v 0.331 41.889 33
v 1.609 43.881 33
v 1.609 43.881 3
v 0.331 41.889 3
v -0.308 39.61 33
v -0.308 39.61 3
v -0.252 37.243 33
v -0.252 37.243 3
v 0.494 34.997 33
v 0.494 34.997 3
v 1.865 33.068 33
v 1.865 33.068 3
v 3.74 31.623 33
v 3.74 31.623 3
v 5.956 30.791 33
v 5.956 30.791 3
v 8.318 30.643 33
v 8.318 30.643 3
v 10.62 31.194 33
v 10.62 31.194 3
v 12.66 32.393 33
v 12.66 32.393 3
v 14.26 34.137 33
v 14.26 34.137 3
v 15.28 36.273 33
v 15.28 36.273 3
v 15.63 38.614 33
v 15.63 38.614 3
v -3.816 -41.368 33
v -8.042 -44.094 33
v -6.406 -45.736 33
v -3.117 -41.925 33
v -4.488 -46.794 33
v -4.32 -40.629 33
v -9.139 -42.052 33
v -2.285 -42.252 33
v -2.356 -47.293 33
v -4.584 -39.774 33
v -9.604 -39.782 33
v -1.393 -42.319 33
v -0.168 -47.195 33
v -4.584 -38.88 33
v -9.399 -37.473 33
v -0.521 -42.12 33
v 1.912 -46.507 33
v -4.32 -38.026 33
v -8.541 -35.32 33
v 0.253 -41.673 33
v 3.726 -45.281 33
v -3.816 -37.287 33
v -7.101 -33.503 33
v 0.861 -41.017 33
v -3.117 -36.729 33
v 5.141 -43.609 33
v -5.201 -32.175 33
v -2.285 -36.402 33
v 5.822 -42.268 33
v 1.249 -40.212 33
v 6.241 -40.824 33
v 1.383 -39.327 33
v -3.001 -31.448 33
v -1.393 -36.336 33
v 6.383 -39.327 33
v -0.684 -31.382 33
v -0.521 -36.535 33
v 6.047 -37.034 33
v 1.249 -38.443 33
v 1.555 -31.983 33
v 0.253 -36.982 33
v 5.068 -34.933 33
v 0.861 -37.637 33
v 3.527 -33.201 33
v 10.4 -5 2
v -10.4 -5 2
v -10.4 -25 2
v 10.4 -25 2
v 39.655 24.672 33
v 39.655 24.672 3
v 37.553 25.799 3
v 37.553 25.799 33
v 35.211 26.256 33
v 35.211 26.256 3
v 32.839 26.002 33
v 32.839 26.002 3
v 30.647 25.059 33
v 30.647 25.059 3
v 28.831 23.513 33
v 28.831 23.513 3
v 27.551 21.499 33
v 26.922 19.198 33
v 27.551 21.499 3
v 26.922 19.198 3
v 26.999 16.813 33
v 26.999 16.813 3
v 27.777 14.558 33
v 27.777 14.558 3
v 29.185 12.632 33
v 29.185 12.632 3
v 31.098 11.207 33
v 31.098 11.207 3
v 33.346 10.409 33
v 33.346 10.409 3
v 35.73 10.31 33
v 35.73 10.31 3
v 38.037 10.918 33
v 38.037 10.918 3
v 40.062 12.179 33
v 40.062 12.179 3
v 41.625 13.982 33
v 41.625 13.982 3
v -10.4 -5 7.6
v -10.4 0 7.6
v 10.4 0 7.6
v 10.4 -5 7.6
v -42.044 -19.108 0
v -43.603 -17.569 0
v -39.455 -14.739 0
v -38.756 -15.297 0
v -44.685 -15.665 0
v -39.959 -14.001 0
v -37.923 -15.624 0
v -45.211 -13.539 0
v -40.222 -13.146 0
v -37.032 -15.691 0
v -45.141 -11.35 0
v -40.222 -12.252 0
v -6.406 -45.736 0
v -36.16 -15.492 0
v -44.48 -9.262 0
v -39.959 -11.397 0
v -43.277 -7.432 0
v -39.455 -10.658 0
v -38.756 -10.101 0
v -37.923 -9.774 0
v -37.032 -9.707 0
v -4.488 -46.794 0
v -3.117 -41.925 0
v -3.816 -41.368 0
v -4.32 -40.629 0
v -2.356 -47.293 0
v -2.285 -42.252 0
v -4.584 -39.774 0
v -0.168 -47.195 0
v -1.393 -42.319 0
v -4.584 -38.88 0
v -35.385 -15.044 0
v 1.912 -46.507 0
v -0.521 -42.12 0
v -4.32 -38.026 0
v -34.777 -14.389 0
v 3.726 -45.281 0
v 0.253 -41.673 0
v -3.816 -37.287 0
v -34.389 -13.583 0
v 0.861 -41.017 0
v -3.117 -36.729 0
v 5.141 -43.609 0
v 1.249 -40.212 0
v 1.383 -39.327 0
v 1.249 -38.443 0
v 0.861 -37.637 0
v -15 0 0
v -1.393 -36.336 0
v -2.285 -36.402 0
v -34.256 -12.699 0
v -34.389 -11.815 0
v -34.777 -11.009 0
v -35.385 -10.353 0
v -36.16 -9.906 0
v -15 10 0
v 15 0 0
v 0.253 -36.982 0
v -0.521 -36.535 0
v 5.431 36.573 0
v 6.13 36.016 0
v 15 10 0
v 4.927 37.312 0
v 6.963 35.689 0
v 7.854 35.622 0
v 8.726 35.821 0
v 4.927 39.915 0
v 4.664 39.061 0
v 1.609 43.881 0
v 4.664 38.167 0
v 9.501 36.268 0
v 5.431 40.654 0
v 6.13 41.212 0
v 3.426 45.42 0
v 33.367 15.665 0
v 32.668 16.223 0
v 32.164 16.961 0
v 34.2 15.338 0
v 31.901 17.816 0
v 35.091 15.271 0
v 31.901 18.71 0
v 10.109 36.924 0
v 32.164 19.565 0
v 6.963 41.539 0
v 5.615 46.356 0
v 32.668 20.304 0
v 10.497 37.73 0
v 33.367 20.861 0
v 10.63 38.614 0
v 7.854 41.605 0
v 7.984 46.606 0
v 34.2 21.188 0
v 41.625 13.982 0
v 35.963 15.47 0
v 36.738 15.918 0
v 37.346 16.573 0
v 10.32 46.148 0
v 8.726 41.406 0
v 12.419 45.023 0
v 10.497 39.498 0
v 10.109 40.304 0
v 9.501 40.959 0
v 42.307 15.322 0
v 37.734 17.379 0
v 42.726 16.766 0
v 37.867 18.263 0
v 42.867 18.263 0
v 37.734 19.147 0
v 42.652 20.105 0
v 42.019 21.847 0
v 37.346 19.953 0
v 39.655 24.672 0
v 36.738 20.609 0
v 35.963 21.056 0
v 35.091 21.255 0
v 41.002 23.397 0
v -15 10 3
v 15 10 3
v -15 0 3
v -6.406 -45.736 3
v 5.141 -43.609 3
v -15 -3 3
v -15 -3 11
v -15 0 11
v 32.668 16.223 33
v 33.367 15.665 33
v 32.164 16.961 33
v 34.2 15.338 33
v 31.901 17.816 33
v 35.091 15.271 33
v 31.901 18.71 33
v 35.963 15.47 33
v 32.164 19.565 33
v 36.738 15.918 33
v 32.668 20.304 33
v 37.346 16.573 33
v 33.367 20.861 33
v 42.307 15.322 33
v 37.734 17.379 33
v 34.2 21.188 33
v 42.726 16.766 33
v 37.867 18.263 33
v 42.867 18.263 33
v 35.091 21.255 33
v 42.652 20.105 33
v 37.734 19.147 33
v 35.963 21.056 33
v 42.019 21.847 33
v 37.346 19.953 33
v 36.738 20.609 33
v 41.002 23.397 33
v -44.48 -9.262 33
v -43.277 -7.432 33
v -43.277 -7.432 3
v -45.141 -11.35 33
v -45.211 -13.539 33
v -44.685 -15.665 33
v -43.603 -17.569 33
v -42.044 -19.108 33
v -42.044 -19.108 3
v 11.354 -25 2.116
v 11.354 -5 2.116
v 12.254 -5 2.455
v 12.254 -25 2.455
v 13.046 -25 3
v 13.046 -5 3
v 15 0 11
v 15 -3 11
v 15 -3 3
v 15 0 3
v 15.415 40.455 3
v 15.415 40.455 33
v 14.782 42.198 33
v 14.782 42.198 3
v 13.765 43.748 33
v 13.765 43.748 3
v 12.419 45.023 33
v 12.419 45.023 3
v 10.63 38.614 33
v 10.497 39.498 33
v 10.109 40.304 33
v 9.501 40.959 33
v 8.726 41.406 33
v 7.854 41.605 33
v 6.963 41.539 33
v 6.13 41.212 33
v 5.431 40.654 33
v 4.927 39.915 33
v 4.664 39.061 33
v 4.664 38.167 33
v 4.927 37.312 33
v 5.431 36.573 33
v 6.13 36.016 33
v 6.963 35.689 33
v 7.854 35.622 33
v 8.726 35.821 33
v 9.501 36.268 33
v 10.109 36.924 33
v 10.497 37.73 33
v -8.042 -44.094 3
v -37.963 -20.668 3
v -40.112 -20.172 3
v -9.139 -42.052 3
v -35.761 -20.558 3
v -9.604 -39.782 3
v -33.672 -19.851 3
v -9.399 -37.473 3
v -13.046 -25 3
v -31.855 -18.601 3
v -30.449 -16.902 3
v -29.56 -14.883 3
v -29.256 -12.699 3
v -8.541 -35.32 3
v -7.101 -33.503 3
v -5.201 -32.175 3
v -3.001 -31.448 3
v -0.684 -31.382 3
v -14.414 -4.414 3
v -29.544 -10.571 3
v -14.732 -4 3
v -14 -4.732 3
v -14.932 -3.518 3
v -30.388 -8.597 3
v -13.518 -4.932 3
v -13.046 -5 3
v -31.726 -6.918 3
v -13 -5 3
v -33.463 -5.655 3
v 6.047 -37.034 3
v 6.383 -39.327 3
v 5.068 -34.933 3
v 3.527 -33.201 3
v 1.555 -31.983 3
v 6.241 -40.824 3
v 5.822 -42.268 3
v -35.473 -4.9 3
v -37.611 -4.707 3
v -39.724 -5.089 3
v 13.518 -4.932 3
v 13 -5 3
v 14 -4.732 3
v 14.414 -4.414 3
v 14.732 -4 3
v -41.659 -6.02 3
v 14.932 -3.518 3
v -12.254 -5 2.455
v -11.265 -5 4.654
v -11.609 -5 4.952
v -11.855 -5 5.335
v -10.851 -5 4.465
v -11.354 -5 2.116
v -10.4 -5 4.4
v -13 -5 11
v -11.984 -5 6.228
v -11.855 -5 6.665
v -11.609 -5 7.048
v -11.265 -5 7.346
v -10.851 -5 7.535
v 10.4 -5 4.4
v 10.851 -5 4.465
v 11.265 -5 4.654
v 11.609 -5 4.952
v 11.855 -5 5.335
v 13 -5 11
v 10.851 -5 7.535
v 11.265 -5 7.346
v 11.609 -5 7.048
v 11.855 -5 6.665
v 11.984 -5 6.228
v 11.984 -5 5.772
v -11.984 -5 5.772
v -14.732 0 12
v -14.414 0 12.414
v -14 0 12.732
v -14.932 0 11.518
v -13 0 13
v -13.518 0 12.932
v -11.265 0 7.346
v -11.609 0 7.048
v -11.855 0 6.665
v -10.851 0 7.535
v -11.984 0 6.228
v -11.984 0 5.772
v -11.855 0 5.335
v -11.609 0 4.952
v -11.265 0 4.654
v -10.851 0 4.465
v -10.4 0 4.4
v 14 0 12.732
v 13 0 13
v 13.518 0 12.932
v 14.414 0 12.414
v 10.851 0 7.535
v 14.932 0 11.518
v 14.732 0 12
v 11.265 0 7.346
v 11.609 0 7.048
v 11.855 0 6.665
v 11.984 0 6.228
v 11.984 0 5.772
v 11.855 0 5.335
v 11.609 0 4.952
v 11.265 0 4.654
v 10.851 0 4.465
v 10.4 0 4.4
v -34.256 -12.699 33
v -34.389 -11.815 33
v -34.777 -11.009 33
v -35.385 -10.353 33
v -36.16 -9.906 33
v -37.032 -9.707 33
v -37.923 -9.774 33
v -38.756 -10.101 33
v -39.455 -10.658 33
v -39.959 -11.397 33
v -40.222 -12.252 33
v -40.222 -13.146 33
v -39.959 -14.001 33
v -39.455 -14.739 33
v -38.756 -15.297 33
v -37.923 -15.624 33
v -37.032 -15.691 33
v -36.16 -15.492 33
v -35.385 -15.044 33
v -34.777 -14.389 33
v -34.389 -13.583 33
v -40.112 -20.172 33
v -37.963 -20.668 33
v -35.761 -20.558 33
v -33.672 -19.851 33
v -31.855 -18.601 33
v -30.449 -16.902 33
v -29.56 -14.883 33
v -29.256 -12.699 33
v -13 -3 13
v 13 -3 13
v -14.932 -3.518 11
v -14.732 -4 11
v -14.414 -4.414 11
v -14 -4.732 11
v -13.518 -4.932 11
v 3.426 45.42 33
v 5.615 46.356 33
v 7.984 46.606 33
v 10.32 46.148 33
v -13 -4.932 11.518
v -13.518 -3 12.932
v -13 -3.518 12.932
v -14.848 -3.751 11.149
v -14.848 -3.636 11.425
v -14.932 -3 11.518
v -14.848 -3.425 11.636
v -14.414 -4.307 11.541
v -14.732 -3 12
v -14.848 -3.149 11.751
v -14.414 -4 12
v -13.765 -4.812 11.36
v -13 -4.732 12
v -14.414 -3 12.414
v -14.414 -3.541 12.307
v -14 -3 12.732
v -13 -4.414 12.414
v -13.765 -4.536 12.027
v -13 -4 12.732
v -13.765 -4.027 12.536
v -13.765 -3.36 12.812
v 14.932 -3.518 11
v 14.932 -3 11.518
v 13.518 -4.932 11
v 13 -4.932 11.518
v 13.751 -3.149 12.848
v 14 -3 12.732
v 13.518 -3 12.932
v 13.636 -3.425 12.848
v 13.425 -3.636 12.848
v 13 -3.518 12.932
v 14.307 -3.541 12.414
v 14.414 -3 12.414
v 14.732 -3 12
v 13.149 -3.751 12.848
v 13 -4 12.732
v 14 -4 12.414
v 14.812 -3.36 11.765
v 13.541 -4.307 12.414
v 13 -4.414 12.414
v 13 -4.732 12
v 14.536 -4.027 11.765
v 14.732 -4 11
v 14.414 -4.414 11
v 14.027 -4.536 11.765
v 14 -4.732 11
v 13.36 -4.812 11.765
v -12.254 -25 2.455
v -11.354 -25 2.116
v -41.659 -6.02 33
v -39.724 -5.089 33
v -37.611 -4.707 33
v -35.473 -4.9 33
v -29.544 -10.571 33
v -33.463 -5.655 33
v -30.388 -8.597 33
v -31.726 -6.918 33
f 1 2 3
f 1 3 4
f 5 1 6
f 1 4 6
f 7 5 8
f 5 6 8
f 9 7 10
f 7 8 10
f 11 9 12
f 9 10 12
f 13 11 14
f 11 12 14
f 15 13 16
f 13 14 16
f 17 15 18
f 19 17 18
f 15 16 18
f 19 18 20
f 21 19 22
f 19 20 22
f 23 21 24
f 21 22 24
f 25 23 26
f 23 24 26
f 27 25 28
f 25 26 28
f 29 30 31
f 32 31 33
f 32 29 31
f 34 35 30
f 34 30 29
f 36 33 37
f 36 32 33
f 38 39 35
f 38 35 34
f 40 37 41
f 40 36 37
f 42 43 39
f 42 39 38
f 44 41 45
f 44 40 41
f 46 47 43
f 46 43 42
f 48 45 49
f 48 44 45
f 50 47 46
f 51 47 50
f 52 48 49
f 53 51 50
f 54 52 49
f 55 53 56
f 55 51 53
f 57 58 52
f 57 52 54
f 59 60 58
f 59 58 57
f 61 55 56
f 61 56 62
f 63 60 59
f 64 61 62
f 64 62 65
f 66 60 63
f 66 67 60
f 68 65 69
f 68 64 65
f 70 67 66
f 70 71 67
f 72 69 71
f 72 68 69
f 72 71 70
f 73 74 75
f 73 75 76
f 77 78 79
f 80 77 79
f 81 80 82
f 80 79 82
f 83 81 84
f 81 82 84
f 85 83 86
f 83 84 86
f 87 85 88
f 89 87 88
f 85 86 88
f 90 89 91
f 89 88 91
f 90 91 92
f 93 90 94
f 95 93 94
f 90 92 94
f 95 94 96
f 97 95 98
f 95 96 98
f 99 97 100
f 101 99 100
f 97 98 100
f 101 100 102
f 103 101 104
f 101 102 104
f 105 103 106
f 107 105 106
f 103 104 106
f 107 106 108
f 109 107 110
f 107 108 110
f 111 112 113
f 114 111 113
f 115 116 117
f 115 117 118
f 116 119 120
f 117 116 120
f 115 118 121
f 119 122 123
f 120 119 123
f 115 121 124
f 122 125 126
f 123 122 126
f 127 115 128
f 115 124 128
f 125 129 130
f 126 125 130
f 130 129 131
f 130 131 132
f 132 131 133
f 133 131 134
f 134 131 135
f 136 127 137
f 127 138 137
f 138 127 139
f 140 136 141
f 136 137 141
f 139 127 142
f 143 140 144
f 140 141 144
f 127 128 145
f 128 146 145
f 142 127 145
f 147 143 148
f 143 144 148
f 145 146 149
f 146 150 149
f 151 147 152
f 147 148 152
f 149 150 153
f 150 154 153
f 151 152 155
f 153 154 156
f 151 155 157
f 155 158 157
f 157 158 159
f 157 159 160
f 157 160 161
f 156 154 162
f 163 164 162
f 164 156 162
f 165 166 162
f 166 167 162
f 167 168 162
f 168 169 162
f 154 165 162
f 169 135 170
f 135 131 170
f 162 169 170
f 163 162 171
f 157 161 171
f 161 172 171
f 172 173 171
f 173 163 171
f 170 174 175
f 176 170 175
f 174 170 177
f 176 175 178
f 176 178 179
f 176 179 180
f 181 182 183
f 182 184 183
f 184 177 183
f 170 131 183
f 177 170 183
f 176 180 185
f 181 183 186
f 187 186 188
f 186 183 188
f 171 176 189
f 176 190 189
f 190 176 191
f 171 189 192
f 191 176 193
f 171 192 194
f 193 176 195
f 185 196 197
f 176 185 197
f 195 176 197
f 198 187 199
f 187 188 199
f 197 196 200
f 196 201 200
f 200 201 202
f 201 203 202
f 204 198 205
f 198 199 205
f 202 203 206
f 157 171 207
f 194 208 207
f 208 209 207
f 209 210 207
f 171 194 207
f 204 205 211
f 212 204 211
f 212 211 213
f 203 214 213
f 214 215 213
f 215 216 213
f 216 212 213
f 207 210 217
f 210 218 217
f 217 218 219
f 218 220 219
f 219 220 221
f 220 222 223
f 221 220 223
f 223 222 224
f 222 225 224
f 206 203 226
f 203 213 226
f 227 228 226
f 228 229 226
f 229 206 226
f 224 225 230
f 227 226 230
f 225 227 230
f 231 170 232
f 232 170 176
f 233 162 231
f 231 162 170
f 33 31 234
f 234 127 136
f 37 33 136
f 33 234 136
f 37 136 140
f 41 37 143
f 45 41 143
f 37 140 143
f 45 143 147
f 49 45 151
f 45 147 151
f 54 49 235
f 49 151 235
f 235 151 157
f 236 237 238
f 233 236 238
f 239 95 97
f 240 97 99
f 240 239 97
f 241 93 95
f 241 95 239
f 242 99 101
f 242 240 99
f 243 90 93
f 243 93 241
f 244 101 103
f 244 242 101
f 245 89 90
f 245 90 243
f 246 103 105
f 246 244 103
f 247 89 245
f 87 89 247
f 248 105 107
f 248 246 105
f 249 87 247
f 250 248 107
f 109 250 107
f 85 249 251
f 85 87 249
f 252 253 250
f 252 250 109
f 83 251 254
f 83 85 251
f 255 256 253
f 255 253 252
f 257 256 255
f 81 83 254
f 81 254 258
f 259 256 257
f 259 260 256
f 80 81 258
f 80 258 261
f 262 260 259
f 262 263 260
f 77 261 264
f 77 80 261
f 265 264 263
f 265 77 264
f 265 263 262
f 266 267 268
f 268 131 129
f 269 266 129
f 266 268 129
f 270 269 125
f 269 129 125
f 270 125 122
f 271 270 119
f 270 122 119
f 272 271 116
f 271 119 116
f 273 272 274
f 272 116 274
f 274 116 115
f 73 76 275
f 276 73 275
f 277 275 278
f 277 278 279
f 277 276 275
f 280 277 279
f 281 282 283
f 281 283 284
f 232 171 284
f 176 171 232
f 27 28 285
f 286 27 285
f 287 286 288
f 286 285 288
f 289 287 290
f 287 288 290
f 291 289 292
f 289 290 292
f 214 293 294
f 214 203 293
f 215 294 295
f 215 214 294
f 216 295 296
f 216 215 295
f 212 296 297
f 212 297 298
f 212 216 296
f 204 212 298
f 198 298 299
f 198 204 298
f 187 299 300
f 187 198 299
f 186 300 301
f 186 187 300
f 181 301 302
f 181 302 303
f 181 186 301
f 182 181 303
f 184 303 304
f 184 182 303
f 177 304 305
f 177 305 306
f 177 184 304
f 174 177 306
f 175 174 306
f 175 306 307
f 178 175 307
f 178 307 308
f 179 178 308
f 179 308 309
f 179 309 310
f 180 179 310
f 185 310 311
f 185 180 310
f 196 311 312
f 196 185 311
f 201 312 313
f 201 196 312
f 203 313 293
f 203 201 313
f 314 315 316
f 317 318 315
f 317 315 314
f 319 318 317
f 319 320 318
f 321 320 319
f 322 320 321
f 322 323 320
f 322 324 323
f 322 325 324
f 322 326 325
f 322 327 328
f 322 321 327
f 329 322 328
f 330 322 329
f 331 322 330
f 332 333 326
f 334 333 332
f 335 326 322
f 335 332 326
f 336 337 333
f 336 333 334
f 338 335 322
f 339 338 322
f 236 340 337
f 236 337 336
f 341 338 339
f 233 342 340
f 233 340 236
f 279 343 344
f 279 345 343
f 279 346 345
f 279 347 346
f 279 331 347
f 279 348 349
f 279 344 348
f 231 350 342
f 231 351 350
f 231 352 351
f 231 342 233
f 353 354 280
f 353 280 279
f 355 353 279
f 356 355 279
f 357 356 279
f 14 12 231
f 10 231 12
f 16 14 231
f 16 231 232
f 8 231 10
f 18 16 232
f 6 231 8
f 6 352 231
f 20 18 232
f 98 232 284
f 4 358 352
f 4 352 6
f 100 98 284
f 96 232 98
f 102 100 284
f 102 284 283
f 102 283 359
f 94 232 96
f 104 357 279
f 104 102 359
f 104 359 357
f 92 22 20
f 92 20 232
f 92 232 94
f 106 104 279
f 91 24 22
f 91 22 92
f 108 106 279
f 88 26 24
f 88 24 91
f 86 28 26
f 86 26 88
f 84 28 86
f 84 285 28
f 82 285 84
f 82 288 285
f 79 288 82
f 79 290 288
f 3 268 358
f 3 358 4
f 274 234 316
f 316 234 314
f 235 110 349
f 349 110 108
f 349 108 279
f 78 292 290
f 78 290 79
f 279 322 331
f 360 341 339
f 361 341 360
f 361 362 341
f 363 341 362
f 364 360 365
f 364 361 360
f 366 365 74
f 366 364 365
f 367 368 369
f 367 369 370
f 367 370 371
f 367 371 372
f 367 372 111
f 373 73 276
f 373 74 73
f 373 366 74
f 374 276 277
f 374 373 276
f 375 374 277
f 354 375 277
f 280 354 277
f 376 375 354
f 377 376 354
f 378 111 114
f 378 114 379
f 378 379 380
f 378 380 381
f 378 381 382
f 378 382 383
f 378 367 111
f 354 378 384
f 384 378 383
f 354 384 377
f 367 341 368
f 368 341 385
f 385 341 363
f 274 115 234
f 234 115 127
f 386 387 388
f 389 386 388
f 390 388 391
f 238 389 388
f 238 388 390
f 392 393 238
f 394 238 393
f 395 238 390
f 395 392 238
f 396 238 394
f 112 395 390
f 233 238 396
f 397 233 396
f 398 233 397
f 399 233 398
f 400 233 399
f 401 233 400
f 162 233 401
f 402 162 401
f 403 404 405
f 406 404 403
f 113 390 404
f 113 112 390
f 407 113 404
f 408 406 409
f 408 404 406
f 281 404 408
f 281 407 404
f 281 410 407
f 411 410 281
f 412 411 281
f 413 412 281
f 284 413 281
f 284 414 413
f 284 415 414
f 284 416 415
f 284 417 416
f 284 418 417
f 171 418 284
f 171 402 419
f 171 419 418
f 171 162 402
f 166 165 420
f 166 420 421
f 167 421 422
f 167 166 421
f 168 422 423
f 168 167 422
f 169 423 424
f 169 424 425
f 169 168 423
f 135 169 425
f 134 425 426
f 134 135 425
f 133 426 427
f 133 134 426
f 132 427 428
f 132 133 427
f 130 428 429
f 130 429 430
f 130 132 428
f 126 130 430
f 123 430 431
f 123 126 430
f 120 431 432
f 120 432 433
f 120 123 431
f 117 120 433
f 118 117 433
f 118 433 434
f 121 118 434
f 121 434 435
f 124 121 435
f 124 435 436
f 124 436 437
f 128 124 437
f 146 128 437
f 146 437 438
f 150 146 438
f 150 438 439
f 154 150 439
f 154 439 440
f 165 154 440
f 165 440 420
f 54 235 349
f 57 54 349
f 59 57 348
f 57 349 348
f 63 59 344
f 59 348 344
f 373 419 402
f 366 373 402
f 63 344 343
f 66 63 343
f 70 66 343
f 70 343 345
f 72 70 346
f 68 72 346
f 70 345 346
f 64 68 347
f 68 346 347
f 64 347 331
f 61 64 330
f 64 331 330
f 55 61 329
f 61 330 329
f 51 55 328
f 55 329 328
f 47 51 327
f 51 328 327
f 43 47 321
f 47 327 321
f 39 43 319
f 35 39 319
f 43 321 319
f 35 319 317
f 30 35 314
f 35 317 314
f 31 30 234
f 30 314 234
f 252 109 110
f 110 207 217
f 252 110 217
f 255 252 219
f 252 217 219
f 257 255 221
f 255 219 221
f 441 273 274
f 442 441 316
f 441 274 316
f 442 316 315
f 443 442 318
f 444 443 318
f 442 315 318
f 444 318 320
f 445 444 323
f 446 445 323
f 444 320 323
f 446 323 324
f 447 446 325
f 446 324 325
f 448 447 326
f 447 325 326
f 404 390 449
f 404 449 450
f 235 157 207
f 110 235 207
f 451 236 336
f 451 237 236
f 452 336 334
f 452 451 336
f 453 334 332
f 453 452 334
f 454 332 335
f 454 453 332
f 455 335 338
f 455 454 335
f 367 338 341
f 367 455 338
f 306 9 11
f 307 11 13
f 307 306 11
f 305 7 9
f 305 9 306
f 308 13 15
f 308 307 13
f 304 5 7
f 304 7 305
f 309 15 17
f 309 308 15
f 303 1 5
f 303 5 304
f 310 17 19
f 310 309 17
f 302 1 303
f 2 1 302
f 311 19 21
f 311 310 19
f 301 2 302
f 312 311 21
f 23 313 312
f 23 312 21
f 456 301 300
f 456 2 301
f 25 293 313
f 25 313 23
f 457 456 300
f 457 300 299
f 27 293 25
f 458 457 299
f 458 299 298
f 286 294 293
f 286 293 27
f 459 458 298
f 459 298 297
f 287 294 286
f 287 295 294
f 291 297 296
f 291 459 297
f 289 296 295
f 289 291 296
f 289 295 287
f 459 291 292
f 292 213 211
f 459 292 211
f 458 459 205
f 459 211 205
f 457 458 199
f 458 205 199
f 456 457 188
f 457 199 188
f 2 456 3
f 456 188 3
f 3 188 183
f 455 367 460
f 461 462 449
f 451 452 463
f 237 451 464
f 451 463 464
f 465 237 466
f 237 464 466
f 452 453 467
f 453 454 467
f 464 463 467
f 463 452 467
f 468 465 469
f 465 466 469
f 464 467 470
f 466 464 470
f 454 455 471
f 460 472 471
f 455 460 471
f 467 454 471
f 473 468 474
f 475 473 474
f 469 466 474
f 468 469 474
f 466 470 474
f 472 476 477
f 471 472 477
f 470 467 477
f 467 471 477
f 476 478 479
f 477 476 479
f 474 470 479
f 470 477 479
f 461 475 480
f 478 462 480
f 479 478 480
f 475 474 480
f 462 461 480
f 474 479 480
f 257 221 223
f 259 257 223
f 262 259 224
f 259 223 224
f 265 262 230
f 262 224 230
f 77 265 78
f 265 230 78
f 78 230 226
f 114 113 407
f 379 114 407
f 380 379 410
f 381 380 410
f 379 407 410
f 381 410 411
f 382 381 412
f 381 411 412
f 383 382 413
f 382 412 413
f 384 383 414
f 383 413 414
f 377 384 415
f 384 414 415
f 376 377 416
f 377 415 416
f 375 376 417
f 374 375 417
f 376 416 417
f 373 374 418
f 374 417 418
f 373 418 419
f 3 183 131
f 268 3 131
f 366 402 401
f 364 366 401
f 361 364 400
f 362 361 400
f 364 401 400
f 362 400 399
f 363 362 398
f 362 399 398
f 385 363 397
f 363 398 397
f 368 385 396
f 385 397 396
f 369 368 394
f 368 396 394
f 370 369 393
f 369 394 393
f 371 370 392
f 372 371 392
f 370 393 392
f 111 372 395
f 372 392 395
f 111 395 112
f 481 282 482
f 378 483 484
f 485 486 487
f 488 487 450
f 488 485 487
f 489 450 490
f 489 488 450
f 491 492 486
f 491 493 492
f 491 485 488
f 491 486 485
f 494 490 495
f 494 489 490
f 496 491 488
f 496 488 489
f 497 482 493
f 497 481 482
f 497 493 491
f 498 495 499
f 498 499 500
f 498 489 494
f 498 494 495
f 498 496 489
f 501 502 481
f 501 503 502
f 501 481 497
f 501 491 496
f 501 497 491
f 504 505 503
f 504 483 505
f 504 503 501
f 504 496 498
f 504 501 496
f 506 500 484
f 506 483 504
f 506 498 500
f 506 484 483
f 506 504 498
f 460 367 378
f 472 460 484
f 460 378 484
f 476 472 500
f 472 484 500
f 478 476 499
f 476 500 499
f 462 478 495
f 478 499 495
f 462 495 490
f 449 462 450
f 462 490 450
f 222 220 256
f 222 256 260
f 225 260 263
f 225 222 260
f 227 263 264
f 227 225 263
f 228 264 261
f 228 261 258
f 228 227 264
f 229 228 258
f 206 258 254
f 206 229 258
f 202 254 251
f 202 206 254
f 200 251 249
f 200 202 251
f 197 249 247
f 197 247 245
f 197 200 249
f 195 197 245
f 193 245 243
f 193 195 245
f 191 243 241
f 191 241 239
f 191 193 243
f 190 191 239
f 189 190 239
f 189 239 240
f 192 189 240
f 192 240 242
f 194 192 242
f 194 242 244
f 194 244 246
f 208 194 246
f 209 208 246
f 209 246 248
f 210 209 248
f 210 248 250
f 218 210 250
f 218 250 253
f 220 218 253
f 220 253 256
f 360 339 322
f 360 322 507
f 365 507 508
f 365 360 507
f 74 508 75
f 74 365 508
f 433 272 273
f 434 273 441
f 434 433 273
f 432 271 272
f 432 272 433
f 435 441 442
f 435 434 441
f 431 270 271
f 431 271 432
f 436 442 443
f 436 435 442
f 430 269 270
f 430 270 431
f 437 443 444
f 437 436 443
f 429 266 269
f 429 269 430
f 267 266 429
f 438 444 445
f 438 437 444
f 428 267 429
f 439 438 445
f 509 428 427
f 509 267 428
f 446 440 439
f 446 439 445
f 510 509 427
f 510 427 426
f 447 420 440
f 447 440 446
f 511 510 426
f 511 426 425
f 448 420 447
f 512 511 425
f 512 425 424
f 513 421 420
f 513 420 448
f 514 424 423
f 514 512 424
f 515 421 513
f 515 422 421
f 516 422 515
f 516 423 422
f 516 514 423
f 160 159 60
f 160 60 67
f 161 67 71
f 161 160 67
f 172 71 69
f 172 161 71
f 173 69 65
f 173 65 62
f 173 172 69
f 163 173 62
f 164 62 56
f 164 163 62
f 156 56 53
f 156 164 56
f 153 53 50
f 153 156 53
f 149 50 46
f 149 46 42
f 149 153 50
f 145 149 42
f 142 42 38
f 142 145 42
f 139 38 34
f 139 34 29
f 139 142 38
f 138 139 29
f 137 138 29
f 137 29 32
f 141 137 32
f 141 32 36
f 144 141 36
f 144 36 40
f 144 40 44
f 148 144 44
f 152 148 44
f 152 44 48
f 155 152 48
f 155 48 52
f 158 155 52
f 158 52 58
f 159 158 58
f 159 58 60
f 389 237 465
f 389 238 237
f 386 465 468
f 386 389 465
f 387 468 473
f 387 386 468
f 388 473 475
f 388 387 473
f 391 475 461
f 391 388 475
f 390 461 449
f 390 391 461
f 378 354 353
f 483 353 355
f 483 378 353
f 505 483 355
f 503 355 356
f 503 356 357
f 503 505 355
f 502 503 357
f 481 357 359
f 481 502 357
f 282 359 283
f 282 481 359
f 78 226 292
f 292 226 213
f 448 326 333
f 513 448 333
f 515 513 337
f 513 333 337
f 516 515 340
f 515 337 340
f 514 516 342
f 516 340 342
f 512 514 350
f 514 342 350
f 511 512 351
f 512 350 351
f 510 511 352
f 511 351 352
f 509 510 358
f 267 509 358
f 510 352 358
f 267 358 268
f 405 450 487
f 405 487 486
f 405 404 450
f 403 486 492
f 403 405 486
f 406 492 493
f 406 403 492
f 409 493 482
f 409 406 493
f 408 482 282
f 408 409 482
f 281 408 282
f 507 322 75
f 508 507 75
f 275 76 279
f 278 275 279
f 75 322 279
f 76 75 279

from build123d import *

# Parameters (mm, degrees)
F0_W      = 30
F0_H      = 10
F0_R      = 3
F1_DEPTH  = 3
F2_R      = 3
F3_DEPTH  = 30
F4_W      = 30
F4_H      = 5
F5_DEPTH  = 10
F7_DEPTH  = 5
F8_R      = 2
F10_DEPTH = 20


with BuildPart() as f1:
    # F0 (on Top) → F1 (new body)
    with BuildSketch(Plane.XY):
        with BuildLine():
            ThreePointArc((-43.277054, -7.431739), (-34.442413, -5.20991), (-29.2557, -12.69893))
            ThreePointArc((-29.2557, -12.69893), (-33.671529, -19.851113), (-42.04413, -19.107591))
            Line((-42.04413, -19.107591), (-6.405723, -45.735934))
            ThreePointArc((-6.405723, -45.735934), (-5.201464, -32.17509), (6.382707, -39.327273))
            ThreePointArc((6.382707, -39.327273), (6.065934, -41.556178), (5.140702, -43.608569))
            Line((5.140702, -43.608569), (41.625059, 13.981723))
            ThreePointArc((41.625059, 13.981723), (26.999486, 16.813462), (39.655494, 24.671681))
            Line((39.655494, 24.671681), (12.418684, 45.022509))
            ThreePointArc((12.418684, 45.022509), (14.782437, 42.198018), (15.630254, 38.613848))
            ThreePointArc((15.630254, 38.613848), (4.816967, 31.124828), (1.6089, 43.881039))
            Line((1.6089, 43.881039), (-43.277054, -7.431739))
        make_face()
        with Locations((0, 5)):
            Rectangle(F0_W, F0_H, mode=Mode.SUBTRACT)
        with BuildLine():
            ThreePointArc((-42.04413, -19.107591), (-33.671529, -19.851113), (-29.2557, -12.69893))
            ThreePointArc((-29.2557, -12.69893), (-34.442413, -5.20991), (-43.277054, -7.431739))
            ThreePointArc((-43.277054, -7.431739), (-45.211467, -13.539027), (-42.04413, -19.107591))
        make_face()
        with Locations((-37.2557, -12.69893)):
            Circle(F0_R, mode=Mode.SUBTRACT)
        with BuildLine():
            ThreePointArc((12.418684, 45.022509), (6.790157, 46.569615), (1.6089, 43.881039))
            ThreePointArc((1.6089, 43.881039), (4.816967, 31.124828), (15.630254, 38.613848))
            ThreePointArc((15.630254, 38.613848), (14.782437, 42.198018), (12.418684, 45.022509))
        make_face()
        with Locations((7.630254, 38.613848)):
            Circle(F0_R, mode=Mode.SUBTRACT)
        with BuildLine():
            ThreePointArc((42.867064, 18.26302), (42.019246, 21.84719), (39.655494, 24.671681))
            ThreePointArc((39.655494, 24.671681), (26.999486, 16.813462), (41.625059, 13.981723))
            ThreePointArc((41.625059, 13.981723), (42.550291, 16.034114), (42.867064, 18.26302))
        make_face()
        with Locations((34.867064, 18.26302)):
            Circle(F0_R, mode=Mode.SUBTRACT)
        with BuildLine():
            ThreePointArc((6.382707, -39.327273), (-5.201464, -32.17509), (-6.405723, -45.735934))
            ThreePointArc((-6.405723, -45.735934), (-0.167735, -47.19485), (5.140702, -43.608569))
            ThreePointArc((5.140702, -43.608569), (6.065934, -41.556178), (6.382707, -39.327273))
        make_face()
        with Locations((-1.617293, -39.327273)):
            Circle(F0_R, mode=Mode.SUBTRACT)
    extrude(amount=F1_DEPTH)

    # F2 (on face) → F3 (join)
    with BuildSketch(Plane.XY.offset(3)):
        with BuildLine():
            ThreePointArc((1.6089, 43.881039), (4.816967, 31.124828), (15.630254, 38.613848))
            ThreePointArc((15.630254, 38.613848), (14.782437, 42.198018), (12.418684, 45.022509))
            ThreePointArc((12.418684, 45.022509), (6.790157, 46.569615), (1.6089, 43.881039))
        make_face()
        with Locations((7.630254, 38.613848)):
            Circle(F2_R, mode=Mode.SUBTRACT)
        with BuildLine():
            ThreePointArc((-29.2557, -12.69893), (-34.442413, -5.20991), (-43.277054, -7.431739))
            ThreePointArc((-43.277054, -7.431739), (-45.211467, -13.539027), (-42.04413, -19.107591))
            ThreePointArc((-42.04413, -19.107591), (-33.671529, -19.851113), (-29.2557, -12.69893))
        make_face()
        with Locations((-37.2557, -12.69893)):
            Circle(F2_R, mode=Mode.SUBTRACT)
        with BuildLine():
            ThreePointArc((42.867064, 18.26302), (42.019246, 21.84719), (39.655494, 24.671681))
            ThreePointArc((39.655494, 24.671681), (26.999486, 16.813462), (41.625059, 13.981723))
            ThreePointArc((41.625059, 13.981723), (42.550291, 16.034114), (42.867064, 18.26302))
        make_face()
        with Locations((34.867064, 18.26302)):
            Circle(F2_R, mode=Mode.SUBTRACT)
        with BuildLine():
            ThreePointArc((-6.405723, -45.735934), (-0.167735, -47.19485), (5.140702, -43.608569))
            ThreePointArc((5.140702, -43.608569), (6.065934, -41.556178), (6.382707, -39.327273))
            ThreePointArc((6.382707, -39.327273), (-5.201464, -32.17509), (-6.405723, -45.735934))
        make_face()
        with Locations((-1.617293, -39.327273)):
            Circle(F2_R, mode=Mode.SUBTRACT)
    extrude(amount=F3_DEPTH)

    # F4 (on face) → F5 (join)
    with BuildSketch(Plane.XY.offset(3)):
        with Locations((0, -2.5)):
            Rectangle(F4_W, F4_H)
    extrude(amount=F5_DEPTH)

    # F6 (on face) → F7 (cut, through all)
    with BuildSketch(Plane(origin=(0, 0, 0), x_dir=(-1, 0, 0), z_dir=(0, 1, 0))):
        with BuildLine():
            Line((10.4, 7.6), (-10.4, 7.6))
            ThreePointArc((-10.4, 7.6), (-12, 6), (-10.4, 4.4))
            Line((-10.4, 4.4), (10.4, 4.4))
            ThreePointArc((10.4, 4.4), (12, 6), (10.4, 7.6))
        make_face()
    extrude(amount=-F7_DEPTH, mode=Mode.SUBTRACT)

    # F8
    f8_edges = [f1.edges().sort_by_distance(p)[0] for p in [
        (15, -5, 8),
        (15, -2.5, 13),
        (0, -5, 13),
        (-15, -5, 8),
        (-15, -2.5, 13),
    ]]
    fillet(f8_edges, radius=F8_R)

    # F9 (on face) → F10 (cut)
    with BuildSketch(Plane.XZ.offset(5)):
        with BuildLine():
            Line((10.4, 10), (-10.4, 10))
            ThreePointArc((-10.4, 10), (-11.785831, 9.752262), (-13, 9.039737))
            Line((-13, 9.039737), (-13, 3))
            Line((-13, 3), (13, 3))
            Line((13, 3), (13, 9.039737))
            ThreePointArc((13, 9.039737), (11.785831, 9.752262), (10.4, 10))
        make_face()
        with BuildLine():
            ThreePointArc((-10.4, 4.4), (-12, 6), (-10.4, 7.6))
            Line((-10.4, 7.6), (10.4, 7.6))
            ThreePointArc((10.4, 7.6), (12, 6), (10.4, 4.4))
            Line((10.4, 4.4), (-10.4, 4.4))
        make_face(mode=Mode.SUBTRACT)
        with BuildLine():
            Line((-13, 3), (-13, 9.039737))
            ThreePointArc((-13, 9.039737), (-14.152262, 4.614169), (-10.4, 2))
            Line((-10.4, 2), (10.4, 2))
            ThreePointArc((10.4, 2), (14.152262, 4.614169), (13, 9.039737))
            Line((13, 9.039737), (13, 3))
            Line((13, 3), (-13, 3))
        make_face()
    extrude(amount=F10_DEPTH, mode=Mode.SUBTRACT)


solid = f1.part
